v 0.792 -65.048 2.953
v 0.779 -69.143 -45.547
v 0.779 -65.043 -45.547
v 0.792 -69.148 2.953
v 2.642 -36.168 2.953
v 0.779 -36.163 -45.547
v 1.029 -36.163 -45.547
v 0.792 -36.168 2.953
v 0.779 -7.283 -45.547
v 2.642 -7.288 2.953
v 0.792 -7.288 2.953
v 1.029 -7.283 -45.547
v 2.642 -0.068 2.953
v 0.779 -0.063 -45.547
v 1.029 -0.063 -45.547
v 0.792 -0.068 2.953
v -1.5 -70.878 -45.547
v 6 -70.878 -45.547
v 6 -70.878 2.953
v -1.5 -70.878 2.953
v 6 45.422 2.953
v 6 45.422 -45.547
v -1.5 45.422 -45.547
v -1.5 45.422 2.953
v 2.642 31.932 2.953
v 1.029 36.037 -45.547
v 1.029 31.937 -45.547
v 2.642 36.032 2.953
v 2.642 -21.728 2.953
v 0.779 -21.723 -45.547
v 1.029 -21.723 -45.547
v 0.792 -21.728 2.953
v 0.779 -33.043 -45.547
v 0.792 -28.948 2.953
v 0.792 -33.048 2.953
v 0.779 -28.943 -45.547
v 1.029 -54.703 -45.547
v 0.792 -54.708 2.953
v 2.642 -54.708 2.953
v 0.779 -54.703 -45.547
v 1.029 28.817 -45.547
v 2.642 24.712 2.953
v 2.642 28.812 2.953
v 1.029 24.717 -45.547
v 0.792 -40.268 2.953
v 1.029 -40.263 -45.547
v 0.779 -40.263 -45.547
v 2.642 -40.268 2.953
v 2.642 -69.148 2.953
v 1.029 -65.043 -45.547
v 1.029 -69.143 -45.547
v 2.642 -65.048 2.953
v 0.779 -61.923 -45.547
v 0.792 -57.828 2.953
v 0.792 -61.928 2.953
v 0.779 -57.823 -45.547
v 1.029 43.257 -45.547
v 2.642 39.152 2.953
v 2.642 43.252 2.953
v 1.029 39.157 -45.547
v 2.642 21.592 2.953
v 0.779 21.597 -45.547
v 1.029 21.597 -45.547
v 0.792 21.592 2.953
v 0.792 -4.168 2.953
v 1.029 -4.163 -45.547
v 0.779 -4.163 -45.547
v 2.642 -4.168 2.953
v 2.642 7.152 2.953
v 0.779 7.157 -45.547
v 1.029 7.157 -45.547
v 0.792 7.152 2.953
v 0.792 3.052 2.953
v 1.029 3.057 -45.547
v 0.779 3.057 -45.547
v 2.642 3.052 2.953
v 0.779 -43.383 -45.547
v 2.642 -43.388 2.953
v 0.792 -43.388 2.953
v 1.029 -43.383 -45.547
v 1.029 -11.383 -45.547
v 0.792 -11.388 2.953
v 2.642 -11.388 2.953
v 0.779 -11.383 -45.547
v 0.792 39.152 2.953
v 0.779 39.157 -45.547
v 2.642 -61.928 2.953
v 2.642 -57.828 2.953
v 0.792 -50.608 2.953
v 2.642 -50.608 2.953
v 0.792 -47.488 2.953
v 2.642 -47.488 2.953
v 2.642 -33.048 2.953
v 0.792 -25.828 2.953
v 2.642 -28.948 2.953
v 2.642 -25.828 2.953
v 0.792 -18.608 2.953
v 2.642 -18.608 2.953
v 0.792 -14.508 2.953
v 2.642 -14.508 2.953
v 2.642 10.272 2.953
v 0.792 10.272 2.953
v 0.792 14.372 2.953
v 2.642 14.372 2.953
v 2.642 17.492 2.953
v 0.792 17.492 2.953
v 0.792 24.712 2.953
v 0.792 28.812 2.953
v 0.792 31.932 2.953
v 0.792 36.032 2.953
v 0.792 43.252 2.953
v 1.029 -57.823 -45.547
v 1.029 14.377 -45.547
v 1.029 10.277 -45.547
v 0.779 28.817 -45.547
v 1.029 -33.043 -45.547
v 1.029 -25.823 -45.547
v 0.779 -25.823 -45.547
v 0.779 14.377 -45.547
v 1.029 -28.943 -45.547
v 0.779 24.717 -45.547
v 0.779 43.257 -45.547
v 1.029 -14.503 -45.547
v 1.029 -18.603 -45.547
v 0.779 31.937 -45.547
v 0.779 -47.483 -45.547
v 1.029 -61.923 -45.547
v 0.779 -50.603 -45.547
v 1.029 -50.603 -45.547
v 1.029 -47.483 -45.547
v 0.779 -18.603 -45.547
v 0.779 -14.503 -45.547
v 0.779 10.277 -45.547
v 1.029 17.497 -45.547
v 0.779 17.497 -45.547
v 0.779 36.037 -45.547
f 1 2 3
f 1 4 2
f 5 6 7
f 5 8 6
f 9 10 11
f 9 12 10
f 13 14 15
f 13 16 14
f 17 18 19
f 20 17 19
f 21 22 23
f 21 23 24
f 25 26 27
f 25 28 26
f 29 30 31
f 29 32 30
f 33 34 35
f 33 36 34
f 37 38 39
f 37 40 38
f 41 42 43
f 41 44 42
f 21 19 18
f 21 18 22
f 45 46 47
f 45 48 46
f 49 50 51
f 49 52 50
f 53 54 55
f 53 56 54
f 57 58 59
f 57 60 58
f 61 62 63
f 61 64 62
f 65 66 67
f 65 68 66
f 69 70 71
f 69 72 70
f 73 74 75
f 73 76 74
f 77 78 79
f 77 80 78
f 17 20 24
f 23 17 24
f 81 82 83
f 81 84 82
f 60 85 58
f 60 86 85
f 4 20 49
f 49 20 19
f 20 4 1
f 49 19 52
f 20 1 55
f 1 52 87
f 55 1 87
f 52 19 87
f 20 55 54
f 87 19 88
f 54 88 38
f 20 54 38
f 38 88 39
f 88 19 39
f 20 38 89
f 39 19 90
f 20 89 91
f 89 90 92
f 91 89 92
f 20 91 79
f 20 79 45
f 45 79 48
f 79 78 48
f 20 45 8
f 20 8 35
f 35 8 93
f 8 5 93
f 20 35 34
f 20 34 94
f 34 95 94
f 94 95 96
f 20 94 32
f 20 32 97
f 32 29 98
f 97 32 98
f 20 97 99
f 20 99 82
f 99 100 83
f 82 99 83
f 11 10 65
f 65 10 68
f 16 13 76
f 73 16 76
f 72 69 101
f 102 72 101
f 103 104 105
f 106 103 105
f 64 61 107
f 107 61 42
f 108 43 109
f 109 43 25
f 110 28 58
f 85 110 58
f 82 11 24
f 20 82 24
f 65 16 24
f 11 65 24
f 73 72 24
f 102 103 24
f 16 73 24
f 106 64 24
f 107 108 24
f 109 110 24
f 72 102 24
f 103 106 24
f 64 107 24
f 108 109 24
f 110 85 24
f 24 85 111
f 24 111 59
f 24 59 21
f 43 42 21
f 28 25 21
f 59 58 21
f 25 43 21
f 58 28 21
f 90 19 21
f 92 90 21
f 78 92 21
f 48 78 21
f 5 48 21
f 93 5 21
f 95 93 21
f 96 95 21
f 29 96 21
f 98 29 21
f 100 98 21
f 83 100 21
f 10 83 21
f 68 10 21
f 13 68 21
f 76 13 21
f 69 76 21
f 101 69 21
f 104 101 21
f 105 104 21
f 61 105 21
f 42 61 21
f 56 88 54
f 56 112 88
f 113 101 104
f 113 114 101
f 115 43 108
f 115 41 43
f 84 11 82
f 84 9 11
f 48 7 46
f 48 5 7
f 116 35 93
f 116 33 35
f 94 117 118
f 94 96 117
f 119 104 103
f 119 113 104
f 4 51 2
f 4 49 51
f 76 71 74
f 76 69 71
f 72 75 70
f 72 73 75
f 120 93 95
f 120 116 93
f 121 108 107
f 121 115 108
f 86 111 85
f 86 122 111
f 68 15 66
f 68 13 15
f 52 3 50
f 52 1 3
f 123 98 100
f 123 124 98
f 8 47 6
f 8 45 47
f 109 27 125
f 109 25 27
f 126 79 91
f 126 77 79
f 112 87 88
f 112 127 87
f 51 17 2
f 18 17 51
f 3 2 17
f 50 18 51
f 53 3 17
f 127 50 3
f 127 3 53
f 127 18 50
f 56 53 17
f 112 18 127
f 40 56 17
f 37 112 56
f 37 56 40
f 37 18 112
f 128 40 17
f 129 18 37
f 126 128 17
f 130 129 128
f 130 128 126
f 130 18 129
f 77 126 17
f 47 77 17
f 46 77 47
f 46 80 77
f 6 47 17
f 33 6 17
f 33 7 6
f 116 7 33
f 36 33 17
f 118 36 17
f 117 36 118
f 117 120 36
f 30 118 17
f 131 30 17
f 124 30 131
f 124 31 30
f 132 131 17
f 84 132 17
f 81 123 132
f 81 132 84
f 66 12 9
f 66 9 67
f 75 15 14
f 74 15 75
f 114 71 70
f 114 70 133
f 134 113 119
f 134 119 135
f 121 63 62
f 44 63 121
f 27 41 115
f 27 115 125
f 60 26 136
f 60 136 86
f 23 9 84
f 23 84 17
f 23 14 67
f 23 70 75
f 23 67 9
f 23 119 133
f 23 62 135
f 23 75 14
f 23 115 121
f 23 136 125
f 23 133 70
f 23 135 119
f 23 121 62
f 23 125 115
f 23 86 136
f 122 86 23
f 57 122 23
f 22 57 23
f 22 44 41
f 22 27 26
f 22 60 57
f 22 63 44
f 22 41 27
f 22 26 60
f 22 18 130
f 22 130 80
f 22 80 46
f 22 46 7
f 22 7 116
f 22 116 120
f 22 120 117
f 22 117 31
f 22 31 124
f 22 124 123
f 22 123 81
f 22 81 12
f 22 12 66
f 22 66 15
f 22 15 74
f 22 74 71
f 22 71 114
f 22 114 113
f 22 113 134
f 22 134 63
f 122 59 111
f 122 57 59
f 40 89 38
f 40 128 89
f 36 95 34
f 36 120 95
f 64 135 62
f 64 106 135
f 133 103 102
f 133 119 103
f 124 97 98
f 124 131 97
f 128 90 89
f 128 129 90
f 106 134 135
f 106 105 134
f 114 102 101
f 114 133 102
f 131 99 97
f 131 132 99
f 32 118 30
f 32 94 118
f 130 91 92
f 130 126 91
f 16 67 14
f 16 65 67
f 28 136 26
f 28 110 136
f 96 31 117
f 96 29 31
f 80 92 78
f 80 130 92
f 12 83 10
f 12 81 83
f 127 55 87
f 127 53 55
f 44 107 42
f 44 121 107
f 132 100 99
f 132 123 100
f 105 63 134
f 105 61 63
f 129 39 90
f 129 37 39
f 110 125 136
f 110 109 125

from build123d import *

# Parameters (mm, degrees)
F0_W      = 151.3
F0_H      = 48.5
F1_DEPTH  = 8
F2_W      = 1.85
F2_H      = 4.1
F3_W      = 0.25
F3_H      = 4.1
F22_DEPTH = 1.5
F23_DEPTH = 2
F24_DEPTH = 35


with BuildPart() as f1:
    # F0 (on Right) → F1 (new body)
    with BuildSketch(Plane.YZ):
        with Locations((4.7718379647, -21.296962655)):
            Rectangle(F0_W, F0_H)
    extrude(amount=F1_DEPTH)

    # F2 (on face) → F4 section 0
    with BuildSketch(Plane.XY.offset(2.953037345)):
        with Locations((1.7172626683, -67.0981232643)):
            Rectangle(F2_W, F2_H)
    # F3 (on face) → F4 section 1
    with BuildSketch(Plane(origin=(0, 0, -45.546962655), x_dir=(1, 0, 0), z_dir=(0, 0, -1))):
        with Locations((0.9037374025, 67.0926149368)):
            Rectangle(F3_W, F3_H)
    loft()

    # F3 (on face) → F5 section 0
    with BuildSketch(Plane(origin=(0, 0, -45.546962655), x_dir=(1, 0, 0), z_dir=(0, 0, -1))):
        with Locations((0.9037374025, 67.0926149368)):
            Rectangle(F3_W, F3_H)
    # F2 (on face) → F5 section 1
    with BuildSketch(Plane.XY.offset(2.953037345)):
        with Locations((1.7172626683, -67.0981232643)):
            Rectangle(F2_W, F2_H)
    loft(mode=Mode.SUBTRACT)

    # F2 (on face) → F6 section 0
    with BuildSketch(Plane.XY.offset(2.953037345)):
        with Locations((1.7172626683, -59.8781232643)):
            Rectangle(F2_W, F2_H)
    # F3 (on face) → F6 section 1
    with BuildSketch(Plane(origin=(0, 0, -45.546962655), x_dir=(1, 0, 0), z_dir=(0, 0, -1))):
        with Locations((0.9037374025, 59.8726149368)):
            Rectangle(F3_W, F3_H)
    loft(mode=Mode.SUBTRACT)

    # F2 (on face) → F7 section 0
    with BuildSketch(Plane.XY.offset(2.953037345)):
        with Locations((1.7172626683, -52.6581232643)):
            Rectangle(F2_W, F2_H)
    # F3 (on face) → F7 section 1
    with BuildSketch(Plane(origin=(0, 0, -45.546962655), x_dir=(1, 0, 0), z_dir=(0, 0, -1))):
        with Locations((0.9037374025, 52.6526149368)):
            Rectangle(F3_W, F3_H)
    loft(mode=Mode.SUBTRACT)

    # F2 (on face) → F8 section 0
    with BuildSketch(Plane.XY.offset(2.953037345)):
        with Locations((1.7172626683, -45.4381232643)):
            Rectangle(F2_W, F2_H)
    # F3 (on face) → F8 section 1
    with BuildSketch(Plane(origin=(0, 0, -45.546962655), x_dir=(1, 0, 0), z_dir=(0, 0, -1))):
        with Locations((0.9037374025, 45.4326149368)):
            Rectangle(F3_W, F3_H)
    loft(mode=Mode.SUBTRACT)

    # F3 (on face) → F9 section 0
    with BuildSketch(Plane(origin=(0, 0, -45.546962655), x_dir=(1, 0, 0), z_dir=(0, 0, -1))):
        with Locations((0.9037374025, 38.2126149368)):
            Rectangle(F3_W, F3_H)
    # F2 (on face) → F9 section 1
    with BuildSketch(Plane.XY.offset(2.953037345)):
        with Locations((1.7172626683, -38.2181232643)):
            Rectangle(F2_W, F2_H)
    loft(mode=Mode.SUBTRACT)

    # F2 (on face) → F10 section 0
    with BuildSketch(Plane.XY.offset(2.953037345)):
        with Locations((1.7172626683, -30.9981232643)):
            Rectangle(F2_W, F2_H)
    # F3 (on face) → F10 section 1
    with BuildSketch(Plane(origin=(0, 0, -45.546962655), x_dir=(1, 0, 0), z_dir=(0, 0, -1))):
        with Locations((0.9037374025, 30.9926149368)):
            Rectangle(F3_W, F3_H)
    loft(mode=Mode.SUBTRACT)

    # F3 (on face) → F11 section 0
    with BuildSketch(Plane(origin=(0, 0, -45.546962655), x_dir=(1, 0, 0), z_dir=(0, 0, -1))):
        with Locations((0.9037374025, 23.7726149368)):
            Rectangle(F3_W, F3_H)
    # F2 (on face) → F11 section 1
    with BuildSketch(Plane.XY.offset(2.953037345)):
        with Locations((1.7172626683, -23.7781232643)):
            Rectangle(F2_W, F2_H)
    loft(mode=Mode.SUBTRACT)

    # F2 (on face) → F12 section 0
    with BuildSketch(Plane.XY.offset(2.953037345)):
        with Locations((1.7172626683, -16.5581232643)):
            Rectangle(F2_W, F2_H)
    # F3 (on face) → F12 section 1
    with BuildSketch(Plane(origin=(0, 0, -45.546962655), x_dir=(1, 0, 0), z_dir=(0, 0, -1))):
        with Locations((0.9037374025, 16.5526149368)):
            Rectangle(F3_W, F3_H)
    loft()

    # F2 (on face) → F13 section 0
    with BuildSketch(Plane.XY.offset(2.953037345)):
        with Locations((1.7172626683, -16.5581232643)):
            Rectangle(F2_W, F2_H)
    # F3 (on face) → F13 section 1
    with BuildSketch(Plane(origin=(0, 0, -45.546962655), x_dir=(1, 0, 0), z_dir=(0, 0, -1))):
        with Locations((0.9037374025, 16.5526149368)):
            Rectangle(F3_W, F3_H)
    loft(mode=Mode.SUBTRACT)

    # F2 (on face) → F14 section 0
    with BuildSketch(Plane.XY.offset(2.953037345)):
        with Locations((1.7172626683, -9.3381232643)):
            Rectangle(F2_W, F2_H)
    # F3 (on face) → F14 section 1
    with BuildSketch(Plane(origin=(0, 0, -45.546962655), x_dir=(1, 0, 0), z_dir=(0, 0, -1))):
        with Locations((0.9037374025, 9.3326149368)):
            Rectangle(F3_W, F3_H)
    loft(mode=Mode.SUBTRACT)

    # F3 (on face) → F15 section 0
    with BuildSketch(Plane(origin=(0, 0, -45.546962655), x_dir=(1, 0, 0), z_dir=(0, 0, -1))):
        with Locations((0.9037374025, 2.1126149368)):
            Rectangle(F3_W, F3_H)
    # F2 (on face) → F15 section 1
    with BuildSketch(Plane.XY.offset(2.953037345)):
        with Locations((1.7172626683, -2.1181232643)):
            Rectangle(F2_W, F2_H)
    loft(mode=Mode.SUBTRACT)

    # F3 (on face) → F16 section 0
    with BuildSketch(Plane(origin=(0, 0, -45.546962655), x_dir=(1, 0, 0), z_dir=(0, 0, -1))):
        with Locations((0.9037374025, -5.1073850632)):
            Rectangle(F3_W, F3_H)
    # F2 (on face) → F16 section 1
    with BuildSketch(Plane.XY.offset(2.953037345)):
        with Locations((1.7172626683, 5.1018767357)):
            Rectangle(F2_W, F2_H)
    loft(mode=Mode.SUBTRACT)

    # F2 (on face) → F17 section 0
    with BuildSketch(Plane.XY.offset(2.953037345)):
        with Locations((1.7172626683, 12.3218767357)):
            Rectangle(F2_W, F2_H)
    # F3 (on face) → F17 section 1
    with BuildSketch(Plane(origin=(0, 0, -45.546962655), x_dir=(1, 0, 0), z_dir=(0, 0, -1))):
        with Locations((0.9037374025, -12.3273850632)):
            Rectangle(F3_W, F3_H)
    loft(mode=Mode.SUBTRACT)

    # F3 (on face) → F18 section 0
    with BuildSketch(Plane(origin=(0, 0, -45.546962655), x_dir=(1, 0, 0), z_dir=(0, 0, -1))):
        with Locations((0.9037374025, -19.5473850632)):
            Rectangle(F3_W, F3_H)
    # F2 (on face) → F18 section 1
    with BuildSketch(Plane.XY.offset(2.953037345)):
        with Locations((1.7172626683, 19.5418767357)):
            Rectangle(F2_W, F2_H)
    loft(mode=Mode.SUBTRACT)

    # F2 (on face) → F19 section 0
    with BuildSketch(Plane.XY.offset(2.953037345)):
        with Locations((1.7172626683, 26.7618767357)):
            Rectangle(F2_W, F2_H)
    # F3 (on face) → F19 section 1
    with BuildSketch(Plane(origin=(0, 0, -45.546962655), x_dir=(1, 0, 0), z_dir=(0, 0, -1))):
        with Locations((0.9037374025, -26.7673850632)):
            Rectangle(F3_W, F3_H)
    loft(mode=Mode.SUBTRACT)

    # F3 (on face) → F20 section 0
    with BuildSketch(Plane(origin=(0, 0, -45.546962655), x_dir=(1, 0, 0), z_dir=(0, 0, -1))):
        with Locations((0.9037374025, -33.9873850632)):
            Rectangle(F3_W, F3_H)
    # F2 (on face) → F20 section 1
    with BuildSketch(Plane.XY.offset(2.953037345)):
        with Locations((1.7172626683, 33.9818767357)):
            Rectangle(F2_W, F2_H)
    loft(mode=Mode.SUBTRACT)

    # F2 (on face) → F21 section 0
    with BuildSketch(Plane.XY.offset(2.953037345)):
        with Locations((1.7172626683, 41.2018767357)):
            Rectangle(F2_W, F2_H)
    # F3 (on face) → F21 section 1
    with BuildSketch(Plane(origin=(0, 0, -45.546962655), x_dir=(1, 0, 0), z_dir=(0, 0, -1))):
        with Locations((0.9037374025, -41.2073850632)):
            Rectangle(F3_W, F3_H)
    loft(mode=Mode.SUBTRACT)

    # F22 (add): a face of the model
    f22_faces = [f1.faces().sort_by_distance(p)[0] for p in [
        (0, 4.7718379647, -21.296962655),
    ]]
    extrude(f22_faces, amount=F22_DEPTH)

    # F23 (cut): a face of the model
    f23_faces = [f1.faces().sort_by_distance(p)[0] for p in [
        (8, 4.7718379647, -21.296962655),
    ]]
    extrude(f23_faces, amount=-F23_DEPTH, mode=Mode.SUBTRACT)

    # F24 (cut): a face of the model
    f24_faces = [f1.faces().sort_by_distance(p)[0] for p in [
        (2.25, 80.4218379647, -21.296962655),
    ]]
    extrude(f24_faces, amount=-F24_DEPTH, mode=Mode.SUBTRACT)


solid = f1.part
